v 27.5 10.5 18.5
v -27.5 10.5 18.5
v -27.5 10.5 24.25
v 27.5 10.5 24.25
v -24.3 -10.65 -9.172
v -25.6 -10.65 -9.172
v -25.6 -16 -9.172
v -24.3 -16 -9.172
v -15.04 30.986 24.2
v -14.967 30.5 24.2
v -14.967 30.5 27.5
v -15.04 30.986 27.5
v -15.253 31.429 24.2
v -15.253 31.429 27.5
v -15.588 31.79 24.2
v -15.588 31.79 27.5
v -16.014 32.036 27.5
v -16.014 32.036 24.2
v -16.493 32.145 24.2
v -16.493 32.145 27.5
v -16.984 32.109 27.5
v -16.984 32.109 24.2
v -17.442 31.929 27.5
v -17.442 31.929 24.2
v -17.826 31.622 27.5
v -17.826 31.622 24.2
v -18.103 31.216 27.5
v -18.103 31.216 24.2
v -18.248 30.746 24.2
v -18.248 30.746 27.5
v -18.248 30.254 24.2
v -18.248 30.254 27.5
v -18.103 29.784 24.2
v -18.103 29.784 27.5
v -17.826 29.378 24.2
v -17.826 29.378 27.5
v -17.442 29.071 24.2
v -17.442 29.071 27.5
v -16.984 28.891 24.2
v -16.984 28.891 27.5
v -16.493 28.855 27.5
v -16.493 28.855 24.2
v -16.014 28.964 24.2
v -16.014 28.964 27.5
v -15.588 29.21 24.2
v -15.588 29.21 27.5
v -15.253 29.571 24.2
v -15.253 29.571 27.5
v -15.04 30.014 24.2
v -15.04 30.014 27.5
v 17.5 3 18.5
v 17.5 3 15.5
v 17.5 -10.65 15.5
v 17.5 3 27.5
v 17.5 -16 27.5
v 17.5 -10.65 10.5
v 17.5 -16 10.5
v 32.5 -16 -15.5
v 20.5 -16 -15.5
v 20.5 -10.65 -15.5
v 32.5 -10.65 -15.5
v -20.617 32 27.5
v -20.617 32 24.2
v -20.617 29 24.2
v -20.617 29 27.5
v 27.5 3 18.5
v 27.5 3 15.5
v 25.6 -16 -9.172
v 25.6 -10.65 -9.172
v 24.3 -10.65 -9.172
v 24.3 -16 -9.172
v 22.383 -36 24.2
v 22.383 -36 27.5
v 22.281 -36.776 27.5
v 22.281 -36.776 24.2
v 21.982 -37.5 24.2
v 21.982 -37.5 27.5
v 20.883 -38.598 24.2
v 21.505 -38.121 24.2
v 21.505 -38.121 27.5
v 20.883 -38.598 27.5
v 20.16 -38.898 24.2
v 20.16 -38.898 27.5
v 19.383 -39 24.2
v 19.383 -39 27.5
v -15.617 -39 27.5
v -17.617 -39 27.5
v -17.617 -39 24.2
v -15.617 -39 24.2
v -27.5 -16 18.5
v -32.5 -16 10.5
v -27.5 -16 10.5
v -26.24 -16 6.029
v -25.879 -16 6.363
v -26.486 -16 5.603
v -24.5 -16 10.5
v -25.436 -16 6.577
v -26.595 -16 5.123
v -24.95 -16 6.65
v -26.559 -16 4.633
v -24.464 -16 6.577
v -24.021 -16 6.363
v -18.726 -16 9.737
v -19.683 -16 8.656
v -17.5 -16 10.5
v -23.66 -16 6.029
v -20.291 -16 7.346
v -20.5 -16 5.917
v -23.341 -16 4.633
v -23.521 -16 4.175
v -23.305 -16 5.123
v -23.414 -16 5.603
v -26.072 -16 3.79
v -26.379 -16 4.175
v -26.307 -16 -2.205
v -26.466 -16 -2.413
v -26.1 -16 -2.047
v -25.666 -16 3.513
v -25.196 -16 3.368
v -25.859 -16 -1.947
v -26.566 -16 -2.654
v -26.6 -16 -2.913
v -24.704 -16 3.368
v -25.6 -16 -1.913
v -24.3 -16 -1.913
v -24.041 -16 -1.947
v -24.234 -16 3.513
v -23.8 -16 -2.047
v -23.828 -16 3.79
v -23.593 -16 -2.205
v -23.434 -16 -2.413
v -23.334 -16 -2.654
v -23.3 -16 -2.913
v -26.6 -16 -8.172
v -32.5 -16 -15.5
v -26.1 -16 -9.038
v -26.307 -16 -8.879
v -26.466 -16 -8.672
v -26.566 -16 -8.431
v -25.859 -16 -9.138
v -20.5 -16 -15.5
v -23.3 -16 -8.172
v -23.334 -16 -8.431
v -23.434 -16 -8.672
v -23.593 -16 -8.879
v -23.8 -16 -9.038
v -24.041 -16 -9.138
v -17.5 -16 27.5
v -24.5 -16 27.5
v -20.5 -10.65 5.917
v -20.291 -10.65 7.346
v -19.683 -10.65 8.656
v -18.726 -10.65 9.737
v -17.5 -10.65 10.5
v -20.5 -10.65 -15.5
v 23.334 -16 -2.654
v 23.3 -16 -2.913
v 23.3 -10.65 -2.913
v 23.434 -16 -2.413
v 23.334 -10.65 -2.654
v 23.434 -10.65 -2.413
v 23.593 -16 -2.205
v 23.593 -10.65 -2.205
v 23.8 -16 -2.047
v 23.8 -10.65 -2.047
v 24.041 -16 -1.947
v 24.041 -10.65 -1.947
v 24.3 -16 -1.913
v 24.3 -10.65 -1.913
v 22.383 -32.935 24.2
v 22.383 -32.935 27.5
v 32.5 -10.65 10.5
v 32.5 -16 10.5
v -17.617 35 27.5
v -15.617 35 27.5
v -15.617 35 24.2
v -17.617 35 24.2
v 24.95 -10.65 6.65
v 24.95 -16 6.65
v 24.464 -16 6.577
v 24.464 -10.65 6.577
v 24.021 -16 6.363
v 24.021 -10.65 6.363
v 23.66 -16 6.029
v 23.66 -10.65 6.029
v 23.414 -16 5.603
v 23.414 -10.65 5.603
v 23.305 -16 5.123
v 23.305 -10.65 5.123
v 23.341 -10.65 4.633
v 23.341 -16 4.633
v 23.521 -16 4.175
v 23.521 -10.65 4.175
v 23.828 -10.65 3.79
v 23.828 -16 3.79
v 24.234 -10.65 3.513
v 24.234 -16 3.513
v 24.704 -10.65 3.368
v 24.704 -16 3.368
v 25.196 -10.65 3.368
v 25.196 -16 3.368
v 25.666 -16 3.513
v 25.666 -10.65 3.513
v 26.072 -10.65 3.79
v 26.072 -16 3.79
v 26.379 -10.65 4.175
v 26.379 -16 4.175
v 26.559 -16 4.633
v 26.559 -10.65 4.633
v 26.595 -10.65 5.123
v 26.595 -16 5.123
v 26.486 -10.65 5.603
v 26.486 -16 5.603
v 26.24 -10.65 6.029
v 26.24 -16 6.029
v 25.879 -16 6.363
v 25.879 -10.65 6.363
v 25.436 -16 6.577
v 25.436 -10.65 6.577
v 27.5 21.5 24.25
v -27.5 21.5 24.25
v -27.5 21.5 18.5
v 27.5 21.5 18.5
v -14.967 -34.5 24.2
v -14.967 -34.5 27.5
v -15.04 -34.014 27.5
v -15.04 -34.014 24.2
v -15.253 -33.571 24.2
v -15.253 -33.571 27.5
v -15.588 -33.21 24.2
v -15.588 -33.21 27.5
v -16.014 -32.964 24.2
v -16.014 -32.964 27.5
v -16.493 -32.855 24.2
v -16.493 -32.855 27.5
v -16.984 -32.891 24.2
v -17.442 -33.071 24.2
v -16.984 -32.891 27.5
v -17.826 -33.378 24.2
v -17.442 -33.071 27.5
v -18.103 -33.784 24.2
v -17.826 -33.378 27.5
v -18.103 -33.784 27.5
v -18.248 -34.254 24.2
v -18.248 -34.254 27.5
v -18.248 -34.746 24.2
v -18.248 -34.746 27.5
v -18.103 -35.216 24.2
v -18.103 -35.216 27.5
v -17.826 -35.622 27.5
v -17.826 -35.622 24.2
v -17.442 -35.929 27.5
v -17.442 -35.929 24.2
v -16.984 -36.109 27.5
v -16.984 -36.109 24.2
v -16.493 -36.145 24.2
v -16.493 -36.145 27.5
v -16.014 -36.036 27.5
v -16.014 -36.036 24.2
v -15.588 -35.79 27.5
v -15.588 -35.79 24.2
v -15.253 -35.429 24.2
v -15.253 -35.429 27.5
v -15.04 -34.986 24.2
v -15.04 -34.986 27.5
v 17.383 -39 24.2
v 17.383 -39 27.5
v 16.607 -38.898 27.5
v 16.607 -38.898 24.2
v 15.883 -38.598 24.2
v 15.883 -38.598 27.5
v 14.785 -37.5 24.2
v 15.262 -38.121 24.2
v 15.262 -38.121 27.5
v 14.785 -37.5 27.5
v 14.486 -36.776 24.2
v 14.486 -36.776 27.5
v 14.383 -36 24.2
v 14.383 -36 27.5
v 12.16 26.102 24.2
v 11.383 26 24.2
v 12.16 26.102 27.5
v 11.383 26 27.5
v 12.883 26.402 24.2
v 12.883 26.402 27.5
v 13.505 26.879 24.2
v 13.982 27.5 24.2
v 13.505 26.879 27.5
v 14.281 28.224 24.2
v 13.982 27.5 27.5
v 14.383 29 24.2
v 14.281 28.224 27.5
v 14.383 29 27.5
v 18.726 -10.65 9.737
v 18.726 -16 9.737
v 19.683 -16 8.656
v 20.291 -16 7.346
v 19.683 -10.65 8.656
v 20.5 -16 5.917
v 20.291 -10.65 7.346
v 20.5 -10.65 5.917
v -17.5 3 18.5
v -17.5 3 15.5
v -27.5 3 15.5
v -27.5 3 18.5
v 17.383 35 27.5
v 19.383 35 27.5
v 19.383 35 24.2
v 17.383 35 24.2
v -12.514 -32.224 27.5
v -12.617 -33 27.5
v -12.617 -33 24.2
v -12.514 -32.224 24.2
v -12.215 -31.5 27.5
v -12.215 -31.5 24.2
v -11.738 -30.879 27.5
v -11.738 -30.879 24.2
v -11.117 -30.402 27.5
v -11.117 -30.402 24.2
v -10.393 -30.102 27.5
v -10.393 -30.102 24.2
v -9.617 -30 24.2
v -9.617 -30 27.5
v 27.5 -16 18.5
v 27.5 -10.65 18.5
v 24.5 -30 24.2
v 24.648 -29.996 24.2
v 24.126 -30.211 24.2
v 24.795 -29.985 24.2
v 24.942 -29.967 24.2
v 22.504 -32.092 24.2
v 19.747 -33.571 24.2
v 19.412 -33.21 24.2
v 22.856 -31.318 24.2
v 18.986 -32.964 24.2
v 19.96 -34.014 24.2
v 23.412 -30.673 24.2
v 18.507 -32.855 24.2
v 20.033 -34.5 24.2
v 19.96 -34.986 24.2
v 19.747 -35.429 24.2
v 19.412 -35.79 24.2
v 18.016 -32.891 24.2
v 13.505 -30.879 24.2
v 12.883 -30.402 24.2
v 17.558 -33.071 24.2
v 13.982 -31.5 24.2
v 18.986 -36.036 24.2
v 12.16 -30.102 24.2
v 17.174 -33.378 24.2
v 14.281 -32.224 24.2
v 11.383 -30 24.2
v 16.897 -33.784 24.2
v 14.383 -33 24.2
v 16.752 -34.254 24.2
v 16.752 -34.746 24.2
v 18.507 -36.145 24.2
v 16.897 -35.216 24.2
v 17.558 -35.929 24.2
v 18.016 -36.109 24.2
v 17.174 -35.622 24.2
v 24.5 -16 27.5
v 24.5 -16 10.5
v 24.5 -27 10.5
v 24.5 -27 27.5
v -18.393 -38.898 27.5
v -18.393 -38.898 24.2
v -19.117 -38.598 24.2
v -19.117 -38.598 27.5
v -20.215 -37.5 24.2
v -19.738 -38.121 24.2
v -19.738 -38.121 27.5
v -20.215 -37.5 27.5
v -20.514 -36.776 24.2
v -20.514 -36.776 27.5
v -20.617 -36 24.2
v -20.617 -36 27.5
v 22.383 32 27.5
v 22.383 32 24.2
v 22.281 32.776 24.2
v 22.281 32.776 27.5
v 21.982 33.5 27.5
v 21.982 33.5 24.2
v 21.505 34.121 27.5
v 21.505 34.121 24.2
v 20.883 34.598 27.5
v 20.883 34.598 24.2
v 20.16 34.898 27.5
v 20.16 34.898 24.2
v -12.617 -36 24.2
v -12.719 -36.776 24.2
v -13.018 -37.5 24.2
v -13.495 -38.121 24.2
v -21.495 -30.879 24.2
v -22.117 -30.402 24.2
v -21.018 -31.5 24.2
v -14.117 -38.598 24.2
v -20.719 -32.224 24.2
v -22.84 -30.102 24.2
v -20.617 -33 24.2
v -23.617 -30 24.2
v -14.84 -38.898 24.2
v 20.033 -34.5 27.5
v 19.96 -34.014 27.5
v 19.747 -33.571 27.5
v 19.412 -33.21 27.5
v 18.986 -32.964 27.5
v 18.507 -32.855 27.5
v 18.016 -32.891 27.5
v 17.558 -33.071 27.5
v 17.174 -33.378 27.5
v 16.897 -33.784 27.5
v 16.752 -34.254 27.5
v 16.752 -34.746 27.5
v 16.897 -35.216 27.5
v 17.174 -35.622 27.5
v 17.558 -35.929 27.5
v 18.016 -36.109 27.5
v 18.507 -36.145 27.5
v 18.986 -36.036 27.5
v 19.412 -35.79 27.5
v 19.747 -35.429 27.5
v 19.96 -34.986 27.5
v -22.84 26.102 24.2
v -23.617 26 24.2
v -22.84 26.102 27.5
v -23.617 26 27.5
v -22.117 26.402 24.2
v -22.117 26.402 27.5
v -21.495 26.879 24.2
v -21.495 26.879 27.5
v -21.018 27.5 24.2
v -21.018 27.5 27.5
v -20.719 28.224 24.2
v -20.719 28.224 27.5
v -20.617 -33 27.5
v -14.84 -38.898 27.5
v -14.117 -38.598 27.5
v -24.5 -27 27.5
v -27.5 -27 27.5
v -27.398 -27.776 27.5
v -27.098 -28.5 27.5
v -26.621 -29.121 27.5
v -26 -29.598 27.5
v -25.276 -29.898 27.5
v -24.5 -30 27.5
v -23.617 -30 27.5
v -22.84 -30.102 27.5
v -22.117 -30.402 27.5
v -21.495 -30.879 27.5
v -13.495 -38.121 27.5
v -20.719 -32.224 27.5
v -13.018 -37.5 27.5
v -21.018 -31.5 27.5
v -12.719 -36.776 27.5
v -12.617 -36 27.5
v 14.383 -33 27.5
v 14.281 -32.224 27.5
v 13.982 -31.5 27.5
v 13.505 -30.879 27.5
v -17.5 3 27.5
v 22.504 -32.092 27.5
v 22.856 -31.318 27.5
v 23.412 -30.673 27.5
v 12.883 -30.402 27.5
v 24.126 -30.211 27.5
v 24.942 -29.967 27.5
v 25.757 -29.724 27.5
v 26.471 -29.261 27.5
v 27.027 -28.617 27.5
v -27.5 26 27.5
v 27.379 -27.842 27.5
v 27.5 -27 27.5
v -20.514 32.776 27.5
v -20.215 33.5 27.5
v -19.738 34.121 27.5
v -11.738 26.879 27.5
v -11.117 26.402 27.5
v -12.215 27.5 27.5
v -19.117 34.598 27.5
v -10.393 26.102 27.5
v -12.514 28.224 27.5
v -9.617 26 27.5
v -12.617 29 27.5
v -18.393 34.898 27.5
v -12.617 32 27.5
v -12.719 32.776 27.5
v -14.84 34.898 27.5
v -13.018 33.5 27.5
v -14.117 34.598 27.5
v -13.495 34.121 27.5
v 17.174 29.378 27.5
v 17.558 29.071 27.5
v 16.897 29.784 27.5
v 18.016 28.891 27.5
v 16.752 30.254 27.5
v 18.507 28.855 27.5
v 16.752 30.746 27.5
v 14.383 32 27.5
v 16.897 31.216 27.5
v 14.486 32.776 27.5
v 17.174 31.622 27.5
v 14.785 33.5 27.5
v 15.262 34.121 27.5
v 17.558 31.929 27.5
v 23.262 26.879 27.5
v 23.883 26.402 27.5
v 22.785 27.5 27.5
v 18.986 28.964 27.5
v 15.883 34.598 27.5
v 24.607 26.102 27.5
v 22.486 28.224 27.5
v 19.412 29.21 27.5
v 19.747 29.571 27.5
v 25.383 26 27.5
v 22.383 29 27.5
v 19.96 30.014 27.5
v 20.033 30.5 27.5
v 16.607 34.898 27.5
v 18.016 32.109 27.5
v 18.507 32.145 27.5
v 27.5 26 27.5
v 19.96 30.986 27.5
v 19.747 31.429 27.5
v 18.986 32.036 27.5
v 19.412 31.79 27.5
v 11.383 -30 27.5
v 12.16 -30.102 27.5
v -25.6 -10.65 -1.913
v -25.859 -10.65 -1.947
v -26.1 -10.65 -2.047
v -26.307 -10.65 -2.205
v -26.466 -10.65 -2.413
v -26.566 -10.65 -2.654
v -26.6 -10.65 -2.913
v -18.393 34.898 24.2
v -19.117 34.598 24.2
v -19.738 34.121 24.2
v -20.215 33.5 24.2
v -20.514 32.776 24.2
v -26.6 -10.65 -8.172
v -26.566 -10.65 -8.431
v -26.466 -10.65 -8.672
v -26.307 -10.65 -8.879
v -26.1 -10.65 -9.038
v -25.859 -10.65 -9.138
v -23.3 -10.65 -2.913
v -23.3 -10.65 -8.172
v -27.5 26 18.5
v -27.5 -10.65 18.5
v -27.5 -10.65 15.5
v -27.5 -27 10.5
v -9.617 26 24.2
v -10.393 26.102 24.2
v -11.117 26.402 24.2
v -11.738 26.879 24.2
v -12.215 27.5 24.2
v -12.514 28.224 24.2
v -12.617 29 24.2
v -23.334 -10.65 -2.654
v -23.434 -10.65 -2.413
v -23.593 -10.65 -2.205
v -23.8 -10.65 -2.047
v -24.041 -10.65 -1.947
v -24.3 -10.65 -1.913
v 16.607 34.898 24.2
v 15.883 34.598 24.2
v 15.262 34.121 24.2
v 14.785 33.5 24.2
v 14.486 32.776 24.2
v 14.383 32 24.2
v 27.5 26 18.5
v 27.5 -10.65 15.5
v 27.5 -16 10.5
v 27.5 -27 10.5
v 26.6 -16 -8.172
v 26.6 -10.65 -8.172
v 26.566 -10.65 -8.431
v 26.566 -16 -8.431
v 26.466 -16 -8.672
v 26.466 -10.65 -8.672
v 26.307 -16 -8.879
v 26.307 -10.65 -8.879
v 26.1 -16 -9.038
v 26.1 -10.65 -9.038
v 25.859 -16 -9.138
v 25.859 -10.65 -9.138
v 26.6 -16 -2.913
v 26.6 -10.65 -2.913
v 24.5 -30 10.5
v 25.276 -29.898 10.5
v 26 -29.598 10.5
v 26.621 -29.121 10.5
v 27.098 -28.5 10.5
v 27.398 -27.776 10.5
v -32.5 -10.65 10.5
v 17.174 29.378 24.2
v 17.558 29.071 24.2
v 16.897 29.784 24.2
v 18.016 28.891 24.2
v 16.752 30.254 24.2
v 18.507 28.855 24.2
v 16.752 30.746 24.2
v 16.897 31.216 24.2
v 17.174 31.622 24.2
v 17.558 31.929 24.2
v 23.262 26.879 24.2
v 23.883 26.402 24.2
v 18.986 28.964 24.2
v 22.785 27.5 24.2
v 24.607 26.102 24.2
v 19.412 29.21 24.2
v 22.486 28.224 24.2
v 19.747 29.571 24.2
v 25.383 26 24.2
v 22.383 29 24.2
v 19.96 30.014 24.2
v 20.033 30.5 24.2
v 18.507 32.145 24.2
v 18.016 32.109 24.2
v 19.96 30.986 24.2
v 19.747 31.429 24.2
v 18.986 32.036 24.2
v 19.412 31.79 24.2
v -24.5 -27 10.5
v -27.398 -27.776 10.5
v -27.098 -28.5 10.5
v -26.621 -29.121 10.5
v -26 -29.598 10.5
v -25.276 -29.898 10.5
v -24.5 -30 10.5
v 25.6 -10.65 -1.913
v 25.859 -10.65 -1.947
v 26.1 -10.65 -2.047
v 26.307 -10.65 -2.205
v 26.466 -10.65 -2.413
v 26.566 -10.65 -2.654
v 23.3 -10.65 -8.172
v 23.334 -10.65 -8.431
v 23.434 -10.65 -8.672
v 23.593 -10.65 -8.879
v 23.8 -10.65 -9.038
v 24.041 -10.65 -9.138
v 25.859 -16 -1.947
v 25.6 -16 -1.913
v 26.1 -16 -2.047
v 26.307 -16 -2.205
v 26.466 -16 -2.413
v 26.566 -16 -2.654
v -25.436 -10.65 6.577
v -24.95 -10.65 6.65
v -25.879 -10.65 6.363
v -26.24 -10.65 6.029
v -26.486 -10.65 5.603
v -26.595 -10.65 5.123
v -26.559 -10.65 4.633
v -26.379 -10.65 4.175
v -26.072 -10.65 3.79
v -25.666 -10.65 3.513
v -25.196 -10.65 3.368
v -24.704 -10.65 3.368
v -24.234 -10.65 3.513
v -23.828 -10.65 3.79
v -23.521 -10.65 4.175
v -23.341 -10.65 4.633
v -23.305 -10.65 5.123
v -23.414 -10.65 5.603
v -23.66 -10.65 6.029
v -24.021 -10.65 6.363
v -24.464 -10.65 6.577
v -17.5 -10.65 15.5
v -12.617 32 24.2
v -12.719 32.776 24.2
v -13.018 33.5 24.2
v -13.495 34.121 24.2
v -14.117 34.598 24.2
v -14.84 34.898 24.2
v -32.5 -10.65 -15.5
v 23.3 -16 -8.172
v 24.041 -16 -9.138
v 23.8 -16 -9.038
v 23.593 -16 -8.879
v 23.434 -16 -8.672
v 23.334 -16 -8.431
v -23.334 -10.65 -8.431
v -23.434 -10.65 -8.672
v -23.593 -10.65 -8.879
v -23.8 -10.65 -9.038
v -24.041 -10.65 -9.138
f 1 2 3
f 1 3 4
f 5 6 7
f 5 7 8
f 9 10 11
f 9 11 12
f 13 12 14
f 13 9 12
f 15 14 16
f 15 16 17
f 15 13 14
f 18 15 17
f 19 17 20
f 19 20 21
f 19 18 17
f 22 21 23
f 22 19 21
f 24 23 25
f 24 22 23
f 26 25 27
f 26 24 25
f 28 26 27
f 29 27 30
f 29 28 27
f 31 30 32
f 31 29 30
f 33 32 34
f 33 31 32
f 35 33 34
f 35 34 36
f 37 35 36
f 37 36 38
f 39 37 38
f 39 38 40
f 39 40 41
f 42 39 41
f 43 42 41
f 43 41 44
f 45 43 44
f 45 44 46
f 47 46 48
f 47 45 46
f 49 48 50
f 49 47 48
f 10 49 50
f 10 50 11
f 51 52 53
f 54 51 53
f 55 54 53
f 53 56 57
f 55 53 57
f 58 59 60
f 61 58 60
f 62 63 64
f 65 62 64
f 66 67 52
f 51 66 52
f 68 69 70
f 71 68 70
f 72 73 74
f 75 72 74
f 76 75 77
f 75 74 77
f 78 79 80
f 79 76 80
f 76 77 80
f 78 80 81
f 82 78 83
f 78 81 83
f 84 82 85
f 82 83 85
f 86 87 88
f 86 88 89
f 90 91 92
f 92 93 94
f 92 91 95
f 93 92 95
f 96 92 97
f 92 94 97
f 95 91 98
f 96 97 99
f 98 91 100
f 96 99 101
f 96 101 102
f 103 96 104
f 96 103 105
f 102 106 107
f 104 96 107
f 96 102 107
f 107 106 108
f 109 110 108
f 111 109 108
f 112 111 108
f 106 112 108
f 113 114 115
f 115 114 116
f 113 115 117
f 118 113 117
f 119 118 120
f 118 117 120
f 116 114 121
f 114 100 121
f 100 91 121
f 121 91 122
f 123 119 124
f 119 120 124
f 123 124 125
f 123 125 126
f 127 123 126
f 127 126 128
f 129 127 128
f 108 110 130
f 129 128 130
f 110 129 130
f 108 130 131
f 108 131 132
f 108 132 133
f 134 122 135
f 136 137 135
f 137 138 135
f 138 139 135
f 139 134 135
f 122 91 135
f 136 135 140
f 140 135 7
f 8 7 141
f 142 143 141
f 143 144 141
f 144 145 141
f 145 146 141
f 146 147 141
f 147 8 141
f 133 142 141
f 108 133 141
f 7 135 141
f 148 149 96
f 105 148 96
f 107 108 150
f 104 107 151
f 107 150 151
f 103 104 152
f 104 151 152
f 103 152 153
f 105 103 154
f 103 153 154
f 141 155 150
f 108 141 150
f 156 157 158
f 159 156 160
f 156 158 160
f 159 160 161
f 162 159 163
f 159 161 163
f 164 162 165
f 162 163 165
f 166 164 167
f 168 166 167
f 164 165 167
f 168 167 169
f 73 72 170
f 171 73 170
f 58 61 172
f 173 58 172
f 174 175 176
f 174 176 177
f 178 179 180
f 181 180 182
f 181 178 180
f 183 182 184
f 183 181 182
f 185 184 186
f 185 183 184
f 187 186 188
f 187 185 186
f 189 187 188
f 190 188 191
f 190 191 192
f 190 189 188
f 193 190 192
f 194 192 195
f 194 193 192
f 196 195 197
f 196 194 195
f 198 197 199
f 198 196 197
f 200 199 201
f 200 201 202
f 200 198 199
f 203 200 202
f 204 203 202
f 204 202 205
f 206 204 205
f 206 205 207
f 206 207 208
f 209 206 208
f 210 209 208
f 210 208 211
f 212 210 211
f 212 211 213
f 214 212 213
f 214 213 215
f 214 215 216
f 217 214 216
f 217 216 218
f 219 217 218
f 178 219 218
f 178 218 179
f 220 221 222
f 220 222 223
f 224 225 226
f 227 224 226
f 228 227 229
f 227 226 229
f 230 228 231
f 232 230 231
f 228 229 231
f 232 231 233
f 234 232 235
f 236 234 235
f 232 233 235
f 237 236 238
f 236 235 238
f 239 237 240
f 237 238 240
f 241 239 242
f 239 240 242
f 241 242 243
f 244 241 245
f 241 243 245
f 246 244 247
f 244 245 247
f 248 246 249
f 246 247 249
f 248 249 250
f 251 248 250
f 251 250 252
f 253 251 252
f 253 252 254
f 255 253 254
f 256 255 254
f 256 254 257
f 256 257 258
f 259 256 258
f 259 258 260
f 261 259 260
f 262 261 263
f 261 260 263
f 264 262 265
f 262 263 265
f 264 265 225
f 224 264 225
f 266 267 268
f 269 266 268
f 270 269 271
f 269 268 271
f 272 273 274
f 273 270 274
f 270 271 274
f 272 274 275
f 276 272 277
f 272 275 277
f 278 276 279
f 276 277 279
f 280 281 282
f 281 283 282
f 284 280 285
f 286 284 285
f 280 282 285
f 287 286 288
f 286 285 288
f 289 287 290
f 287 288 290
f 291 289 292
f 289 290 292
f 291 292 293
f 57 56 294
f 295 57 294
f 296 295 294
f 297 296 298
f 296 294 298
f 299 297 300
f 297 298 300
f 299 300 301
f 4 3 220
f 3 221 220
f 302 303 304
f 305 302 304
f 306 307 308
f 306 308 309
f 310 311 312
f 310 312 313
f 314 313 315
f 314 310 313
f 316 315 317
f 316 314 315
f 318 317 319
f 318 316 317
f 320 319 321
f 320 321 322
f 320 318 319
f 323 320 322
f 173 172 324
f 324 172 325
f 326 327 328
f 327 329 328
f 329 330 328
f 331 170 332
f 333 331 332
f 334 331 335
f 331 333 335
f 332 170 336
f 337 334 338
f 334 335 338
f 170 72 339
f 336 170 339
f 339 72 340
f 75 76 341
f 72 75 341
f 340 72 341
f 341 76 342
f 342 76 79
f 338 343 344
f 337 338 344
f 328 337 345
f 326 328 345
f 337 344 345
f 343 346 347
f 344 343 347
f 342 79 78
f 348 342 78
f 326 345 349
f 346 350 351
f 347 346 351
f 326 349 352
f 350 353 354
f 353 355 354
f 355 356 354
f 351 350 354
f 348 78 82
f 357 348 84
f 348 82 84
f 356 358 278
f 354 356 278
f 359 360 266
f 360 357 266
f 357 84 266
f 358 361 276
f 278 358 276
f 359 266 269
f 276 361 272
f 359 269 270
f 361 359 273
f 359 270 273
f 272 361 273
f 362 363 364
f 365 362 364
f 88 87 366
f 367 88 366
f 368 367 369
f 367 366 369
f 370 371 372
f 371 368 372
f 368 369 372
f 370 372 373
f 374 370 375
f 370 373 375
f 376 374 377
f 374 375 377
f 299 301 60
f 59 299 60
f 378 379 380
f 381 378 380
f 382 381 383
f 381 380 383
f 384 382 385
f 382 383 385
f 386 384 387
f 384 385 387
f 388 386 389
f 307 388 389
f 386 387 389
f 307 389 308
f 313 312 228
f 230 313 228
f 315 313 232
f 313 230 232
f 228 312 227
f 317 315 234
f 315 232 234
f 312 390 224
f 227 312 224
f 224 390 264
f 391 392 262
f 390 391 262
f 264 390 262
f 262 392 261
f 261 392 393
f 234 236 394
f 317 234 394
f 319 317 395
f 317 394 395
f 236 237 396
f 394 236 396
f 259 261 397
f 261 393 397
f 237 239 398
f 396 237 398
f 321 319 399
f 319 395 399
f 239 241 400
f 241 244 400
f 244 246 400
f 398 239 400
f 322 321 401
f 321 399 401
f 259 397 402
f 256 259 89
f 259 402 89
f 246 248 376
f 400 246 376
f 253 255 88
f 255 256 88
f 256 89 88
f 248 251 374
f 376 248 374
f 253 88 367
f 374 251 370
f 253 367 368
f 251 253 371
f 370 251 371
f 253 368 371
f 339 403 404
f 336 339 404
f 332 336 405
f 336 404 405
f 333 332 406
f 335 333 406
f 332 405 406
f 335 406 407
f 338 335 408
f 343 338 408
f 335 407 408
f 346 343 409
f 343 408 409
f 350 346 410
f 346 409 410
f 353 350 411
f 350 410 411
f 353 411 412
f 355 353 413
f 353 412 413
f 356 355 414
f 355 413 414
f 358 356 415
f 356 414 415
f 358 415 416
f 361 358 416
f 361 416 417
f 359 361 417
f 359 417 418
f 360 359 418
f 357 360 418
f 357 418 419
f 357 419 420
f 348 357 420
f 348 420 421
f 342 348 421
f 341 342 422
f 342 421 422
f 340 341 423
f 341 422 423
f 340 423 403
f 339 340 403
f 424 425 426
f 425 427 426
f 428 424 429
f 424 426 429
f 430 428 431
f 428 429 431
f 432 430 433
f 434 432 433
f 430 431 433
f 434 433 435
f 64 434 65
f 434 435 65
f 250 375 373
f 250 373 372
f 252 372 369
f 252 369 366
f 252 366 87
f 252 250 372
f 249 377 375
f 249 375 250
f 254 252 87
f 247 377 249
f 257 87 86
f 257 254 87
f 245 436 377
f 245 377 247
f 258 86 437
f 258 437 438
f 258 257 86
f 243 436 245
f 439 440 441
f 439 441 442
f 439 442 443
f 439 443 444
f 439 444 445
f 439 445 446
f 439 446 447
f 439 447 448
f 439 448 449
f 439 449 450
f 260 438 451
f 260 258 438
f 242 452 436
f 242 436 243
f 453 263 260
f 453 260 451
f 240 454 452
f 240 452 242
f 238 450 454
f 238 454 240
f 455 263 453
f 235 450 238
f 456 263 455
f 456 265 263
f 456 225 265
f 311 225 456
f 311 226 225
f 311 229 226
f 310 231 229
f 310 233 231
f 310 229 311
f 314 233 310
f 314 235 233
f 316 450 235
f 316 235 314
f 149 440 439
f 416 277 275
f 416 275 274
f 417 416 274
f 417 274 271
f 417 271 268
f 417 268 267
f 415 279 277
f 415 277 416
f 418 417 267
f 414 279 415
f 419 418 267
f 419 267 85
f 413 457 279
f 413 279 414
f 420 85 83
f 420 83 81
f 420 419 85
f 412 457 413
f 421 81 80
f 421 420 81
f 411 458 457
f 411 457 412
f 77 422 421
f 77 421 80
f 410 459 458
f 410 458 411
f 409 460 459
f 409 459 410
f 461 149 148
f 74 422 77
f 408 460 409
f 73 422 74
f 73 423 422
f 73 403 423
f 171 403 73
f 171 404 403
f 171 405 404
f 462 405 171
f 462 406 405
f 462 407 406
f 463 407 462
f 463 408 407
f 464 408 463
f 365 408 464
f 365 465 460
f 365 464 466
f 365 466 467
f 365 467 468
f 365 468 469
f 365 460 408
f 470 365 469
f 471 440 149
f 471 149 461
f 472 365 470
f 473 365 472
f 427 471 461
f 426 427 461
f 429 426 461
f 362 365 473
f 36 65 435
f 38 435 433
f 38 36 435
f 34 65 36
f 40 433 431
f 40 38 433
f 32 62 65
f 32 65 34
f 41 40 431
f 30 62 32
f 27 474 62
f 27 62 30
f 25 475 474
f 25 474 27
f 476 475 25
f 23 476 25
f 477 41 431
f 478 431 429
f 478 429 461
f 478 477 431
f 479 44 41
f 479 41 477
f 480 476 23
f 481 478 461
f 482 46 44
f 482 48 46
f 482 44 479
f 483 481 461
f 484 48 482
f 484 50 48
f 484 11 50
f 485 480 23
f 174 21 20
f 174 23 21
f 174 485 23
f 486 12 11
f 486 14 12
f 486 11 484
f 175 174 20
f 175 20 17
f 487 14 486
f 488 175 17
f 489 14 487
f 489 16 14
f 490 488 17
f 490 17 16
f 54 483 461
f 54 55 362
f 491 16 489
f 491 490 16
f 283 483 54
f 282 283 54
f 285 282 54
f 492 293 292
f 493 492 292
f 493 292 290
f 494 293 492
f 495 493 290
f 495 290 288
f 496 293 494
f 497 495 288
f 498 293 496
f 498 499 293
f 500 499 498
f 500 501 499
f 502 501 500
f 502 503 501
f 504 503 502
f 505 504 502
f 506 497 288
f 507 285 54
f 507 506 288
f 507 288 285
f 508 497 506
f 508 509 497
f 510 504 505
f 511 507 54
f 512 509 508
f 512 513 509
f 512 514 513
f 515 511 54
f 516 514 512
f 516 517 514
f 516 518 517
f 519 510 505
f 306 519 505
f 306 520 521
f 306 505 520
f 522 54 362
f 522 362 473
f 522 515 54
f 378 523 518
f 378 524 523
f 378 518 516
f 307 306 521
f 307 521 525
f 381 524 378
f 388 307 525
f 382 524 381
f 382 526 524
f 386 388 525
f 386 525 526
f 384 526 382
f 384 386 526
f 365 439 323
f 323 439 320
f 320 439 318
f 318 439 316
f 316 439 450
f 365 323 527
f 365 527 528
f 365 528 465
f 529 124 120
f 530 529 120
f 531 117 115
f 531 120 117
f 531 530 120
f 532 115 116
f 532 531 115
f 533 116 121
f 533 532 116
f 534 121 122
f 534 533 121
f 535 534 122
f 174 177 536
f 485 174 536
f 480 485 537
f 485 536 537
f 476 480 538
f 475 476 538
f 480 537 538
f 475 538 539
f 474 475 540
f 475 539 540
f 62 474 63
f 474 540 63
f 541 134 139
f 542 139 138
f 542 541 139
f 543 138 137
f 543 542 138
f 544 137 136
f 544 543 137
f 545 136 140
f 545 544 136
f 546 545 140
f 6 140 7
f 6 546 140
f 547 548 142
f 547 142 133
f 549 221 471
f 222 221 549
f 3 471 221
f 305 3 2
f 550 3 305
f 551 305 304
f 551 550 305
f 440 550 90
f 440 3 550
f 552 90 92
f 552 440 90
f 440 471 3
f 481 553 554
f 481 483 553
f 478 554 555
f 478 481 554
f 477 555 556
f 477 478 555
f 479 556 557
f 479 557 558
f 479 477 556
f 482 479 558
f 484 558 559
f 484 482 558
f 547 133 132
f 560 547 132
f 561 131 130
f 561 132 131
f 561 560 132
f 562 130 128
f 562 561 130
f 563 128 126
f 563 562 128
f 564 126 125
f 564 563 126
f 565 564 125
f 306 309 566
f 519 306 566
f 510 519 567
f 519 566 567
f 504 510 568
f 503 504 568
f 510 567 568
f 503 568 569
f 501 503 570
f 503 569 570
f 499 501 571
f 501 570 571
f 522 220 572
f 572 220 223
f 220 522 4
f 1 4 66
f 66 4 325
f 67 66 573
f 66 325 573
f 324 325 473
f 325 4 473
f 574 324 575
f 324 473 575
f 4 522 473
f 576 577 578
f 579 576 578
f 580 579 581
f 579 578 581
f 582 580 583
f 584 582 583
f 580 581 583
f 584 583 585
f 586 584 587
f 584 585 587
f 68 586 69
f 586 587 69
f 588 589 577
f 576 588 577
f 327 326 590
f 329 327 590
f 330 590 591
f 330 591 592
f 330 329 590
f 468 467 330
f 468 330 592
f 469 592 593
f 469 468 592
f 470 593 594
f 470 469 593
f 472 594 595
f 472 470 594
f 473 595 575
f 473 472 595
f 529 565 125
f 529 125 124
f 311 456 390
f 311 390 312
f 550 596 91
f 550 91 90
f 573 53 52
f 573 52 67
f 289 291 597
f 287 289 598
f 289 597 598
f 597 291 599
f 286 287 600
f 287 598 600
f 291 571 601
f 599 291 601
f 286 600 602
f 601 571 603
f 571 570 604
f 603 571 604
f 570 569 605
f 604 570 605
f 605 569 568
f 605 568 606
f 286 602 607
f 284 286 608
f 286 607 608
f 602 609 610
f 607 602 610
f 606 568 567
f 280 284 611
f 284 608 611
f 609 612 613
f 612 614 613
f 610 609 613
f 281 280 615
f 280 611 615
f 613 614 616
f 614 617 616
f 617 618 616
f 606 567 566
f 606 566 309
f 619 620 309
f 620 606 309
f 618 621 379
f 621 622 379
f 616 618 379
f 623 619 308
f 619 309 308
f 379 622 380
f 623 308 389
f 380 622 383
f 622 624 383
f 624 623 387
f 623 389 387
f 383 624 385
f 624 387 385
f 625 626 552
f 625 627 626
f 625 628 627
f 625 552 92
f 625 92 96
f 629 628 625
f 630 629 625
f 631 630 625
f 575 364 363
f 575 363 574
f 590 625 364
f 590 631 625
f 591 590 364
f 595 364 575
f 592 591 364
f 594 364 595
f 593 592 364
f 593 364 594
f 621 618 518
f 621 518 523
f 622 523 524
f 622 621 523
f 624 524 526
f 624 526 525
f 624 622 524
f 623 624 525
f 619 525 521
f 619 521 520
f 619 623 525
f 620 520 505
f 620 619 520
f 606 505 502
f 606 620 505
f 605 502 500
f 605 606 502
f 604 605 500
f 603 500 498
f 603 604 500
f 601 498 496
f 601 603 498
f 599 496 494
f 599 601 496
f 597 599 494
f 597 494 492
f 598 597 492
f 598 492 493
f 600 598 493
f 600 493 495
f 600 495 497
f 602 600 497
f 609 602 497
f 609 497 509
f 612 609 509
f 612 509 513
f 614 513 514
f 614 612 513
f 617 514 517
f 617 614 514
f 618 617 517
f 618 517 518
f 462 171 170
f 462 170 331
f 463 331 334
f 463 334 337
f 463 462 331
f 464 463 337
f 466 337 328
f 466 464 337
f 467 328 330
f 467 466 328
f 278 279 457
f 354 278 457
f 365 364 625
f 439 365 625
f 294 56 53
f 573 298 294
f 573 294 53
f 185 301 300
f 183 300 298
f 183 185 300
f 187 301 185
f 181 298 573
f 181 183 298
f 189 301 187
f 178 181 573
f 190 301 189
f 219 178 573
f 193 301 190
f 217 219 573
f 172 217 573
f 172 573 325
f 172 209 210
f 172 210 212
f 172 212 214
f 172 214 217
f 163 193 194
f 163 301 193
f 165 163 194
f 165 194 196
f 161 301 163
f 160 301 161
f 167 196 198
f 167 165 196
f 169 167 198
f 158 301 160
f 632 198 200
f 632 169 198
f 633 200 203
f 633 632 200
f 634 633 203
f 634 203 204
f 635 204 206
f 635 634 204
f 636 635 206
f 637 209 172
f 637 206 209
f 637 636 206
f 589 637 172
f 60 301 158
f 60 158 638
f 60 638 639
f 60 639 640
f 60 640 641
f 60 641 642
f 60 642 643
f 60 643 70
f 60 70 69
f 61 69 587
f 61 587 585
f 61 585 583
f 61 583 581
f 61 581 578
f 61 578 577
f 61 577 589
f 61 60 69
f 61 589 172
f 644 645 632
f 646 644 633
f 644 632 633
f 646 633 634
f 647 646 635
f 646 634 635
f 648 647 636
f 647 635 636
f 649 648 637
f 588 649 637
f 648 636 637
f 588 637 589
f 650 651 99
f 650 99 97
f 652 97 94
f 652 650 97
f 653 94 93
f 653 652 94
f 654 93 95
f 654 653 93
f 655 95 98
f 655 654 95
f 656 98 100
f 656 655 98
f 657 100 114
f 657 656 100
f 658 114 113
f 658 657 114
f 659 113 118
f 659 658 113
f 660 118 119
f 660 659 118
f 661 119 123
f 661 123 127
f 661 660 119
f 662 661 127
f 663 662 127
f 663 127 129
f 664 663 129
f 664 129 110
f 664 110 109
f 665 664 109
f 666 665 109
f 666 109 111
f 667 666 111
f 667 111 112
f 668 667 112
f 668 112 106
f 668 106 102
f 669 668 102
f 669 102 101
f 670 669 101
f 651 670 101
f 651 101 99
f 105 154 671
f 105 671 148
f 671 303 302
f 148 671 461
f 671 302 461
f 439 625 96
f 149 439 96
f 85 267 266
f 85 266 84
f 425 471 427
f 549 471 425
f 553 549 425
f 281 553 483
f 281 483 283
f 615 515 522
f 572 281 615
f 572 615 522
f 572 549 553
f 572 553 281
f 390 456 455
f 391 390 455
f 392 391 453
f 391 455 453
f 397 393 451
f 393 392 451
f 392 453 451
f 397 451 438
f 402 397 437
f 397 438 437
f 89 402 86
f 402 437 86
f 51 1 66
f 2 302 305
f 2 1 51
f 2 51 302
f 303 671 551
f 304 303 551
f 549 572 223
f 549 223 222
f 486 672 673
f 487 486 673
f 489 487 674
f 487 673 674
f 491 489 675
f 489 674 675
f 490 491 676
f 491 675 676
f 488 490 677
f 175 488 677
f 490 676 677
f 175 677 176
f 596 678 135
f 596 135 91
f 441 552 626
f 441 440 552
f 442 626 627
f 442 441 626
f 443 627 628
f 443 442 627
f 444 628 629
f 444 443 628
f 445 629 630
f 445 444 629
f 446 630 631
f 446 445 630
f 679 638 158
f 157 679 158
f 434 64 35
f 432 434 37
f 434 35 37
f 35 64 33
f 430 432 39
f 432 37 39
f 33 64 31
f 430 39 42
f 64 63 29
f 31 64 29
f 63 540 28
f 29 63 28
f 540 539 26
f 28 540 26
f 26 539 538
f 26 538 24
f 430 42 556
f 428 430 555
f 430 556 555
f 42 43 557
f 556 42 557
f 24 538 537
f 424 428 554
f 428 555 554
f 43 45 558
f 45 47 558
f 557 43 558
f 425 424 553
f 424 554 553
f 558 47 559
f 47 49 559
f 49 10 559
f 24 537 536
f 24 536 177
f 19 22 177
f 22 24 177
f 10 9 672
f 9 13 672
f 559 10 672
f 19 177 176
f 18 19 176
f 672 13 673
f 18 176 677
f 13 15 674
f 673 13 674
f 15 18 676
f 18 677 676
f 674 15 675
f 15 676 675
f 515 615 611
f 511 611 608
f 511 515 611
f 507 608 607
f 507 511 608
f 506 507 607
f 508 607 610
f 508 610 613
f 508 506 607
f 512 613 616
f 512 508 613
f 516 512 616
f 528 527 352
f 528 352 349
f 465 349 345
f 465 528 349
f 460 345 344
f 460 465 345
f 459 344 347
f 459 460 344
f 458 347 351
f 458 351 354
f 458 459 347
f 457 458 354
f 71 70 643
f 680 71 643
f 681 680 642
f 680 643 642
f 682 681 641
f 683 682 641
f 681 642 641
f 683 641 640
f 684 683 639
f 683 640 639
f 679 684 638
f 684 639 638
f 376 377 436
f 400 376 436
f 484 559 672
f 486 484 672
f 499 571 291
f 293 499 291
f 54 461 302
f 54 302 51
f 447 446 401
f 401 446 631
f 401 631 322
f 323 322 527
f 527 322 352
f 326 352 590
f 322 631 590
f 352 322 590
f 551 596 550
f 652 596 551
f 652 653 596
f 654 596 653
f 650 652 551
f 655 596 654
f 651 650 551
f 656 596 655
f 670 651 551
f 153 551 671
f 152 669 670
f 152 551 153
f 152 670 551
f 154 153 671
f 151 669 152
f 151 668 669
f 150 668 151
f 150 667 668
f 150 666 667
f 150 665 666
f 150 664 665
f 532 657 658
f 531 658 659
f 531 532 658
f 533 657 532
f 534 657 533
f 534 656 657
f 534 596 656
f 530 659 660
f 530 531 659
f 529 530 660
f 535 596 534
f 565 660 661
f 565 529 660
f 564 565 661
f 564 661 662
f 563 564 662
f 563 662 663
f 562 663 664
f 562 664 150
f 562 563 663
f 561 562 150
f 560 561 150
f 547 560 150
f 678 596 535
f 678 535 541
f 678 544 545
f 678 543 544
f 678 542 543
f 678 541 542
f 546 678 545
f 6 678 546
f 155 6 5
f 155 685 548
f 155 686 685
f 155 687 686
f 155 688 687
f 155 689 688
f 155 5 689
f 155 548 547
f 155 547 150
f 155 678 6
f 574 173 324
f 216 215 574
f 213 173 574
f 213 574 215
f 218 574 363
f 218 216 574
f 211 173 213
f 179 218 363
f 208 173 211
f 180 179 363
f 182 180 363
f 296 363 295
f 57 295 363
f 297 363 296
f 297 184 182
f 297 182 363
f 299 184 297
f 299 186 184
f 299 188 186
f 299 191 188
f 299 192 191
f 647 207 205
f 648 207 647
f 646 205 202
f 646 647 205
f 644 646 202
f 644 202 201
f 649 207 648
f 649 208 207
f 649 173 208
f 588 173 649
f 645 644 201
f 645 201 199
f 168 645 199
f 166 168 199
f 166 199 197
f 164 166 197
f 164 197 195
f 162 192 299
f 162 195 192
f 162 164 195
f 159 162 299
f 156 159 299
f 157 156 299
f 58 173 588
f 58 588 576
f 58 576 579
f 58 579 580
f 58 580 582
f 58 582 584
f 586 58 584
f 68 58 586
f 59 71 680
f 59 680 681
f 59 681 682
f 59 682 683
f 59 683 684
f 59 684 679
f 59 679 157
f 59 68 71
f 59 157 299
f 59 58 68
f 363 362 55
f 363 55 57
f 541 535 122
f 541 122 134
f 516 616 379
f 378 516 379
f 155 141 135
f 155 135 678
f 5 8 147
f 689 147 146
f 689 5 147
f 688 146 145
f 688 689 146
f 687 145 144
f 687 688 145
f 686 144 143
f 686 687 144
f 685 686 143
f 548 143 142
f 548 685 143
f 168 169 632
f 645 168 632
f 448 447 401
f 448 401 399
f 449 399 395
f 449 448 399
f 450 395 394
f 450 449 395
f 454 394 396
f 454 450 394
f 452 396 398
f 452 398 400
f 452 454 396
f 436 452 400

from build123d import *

# Parameters (mm, degrees)
SKETCH_1_W           = 7
SKETCH_1_H           = 21
SKETCH_1_R           = 1.65
EXTRUDE_1_DEPTH      = 3
EXTRUDE_1_2_DEPTH    = 3
SKETCH_2_W           = 55
SKETCH_2_H           = 30
EXTRUDE_2_DEPTH      = 3
SKETCH_3_W           = 55
SKETCH_3_H           = 30
EXTRUDE_3_DEPTH      = 14
SKETCH_4_W           = 55
SKETCH_4_H           = 17
EXTRUDE_4_DEPTH      = 22
SKETCH_5_W           = 66.735039671
SKETCH_5_H           = 6
CUT_EXTRUDE_1_DEPTH  = 13.75
CUT_EXTRUDE_2_DEPTH  = 20
SKETCH2_W            = 7
SKETCH2_H            = 21
SKETCH2_R            = 1.65
BOSS_EXTRUDE1_DEPTH  = 3
SKETCH3_W            = 7
SKETCH3_H            = 6
BOSS_EXTRUDE2_DEPTH  = 5
SKETCH4_W            = 3
SKETCH4_H            = 6
BOSS_EXTRUDE3_DEPTH  = 41
SKETCH5_W            = 8
SKETCH5_H            = 9
SKETCH5_R            = 1.65
BOSS_EXTRUDE4_DEPTH  = 3.3
FILLET1_R            = 5
FILLET2_R            = 3
FILLET3_R            = 3
SKETCH6_W            = 55
SKETCH6_H            = 17
BOSS_EXTRUDE5_DEPTH  = 4
MIRROR2_START        = 24.2
MIRROR2_OUTLINE_R    = 1.65
MIRROR2_DEPTH        = 3.3
FILLET4_R            = 3
SKETCH8_W            = 55
SKETCH8_H            = 7
CUT_EXTRUDE1_DEPTH   = 8
SKETCH10_R           = 1.65
BOSS_EXTRUDE6_DEPTH  = 10
CUT_EXTRUDE2_DEPTH   = 10
SKETCH12_W           = 55
SKETCH12_H           = 13.75
CUT_EXTRUDE3_DEPTH   = 2.5
CUT_EXTRUDE4_DEPTH   = 10
SKETCH15_W           = 41
SKETCH15_H           = 3
CUT_EXTRUDE5_DEPTH   = 60.476886267
SKETCH17_W           = 55
SKETCH17_H           = 5.75
CUT_EXTRUDE6_DEPTH   = 2.5
BOSS_EXTRUDE8_DEPTH  = 17
SKETCH19_W           = 55
SKETCH19_H           = 7.5
CUT_EXTRUDE8_DEPTH   = 8
SKETCH20_W           = 10
SKETCH20_H           = 13
CUT_EXTRUDE9_DEPTH   = 5
SKETCH16_W           = 26
SKETCH16_H           = 6
BOSS_EXTRUDE9_DEPTH  = 5
BOSS_EXTRUDE10_DEPTH = 6
SKETCH23_R           = 1.65
CUT_EXTRUDE10_DEPTH  = 0.65


# Read off the part's stored shape, not the designer's step: Mirror2
with BuildPart() as part:
    # 草图1 → 凸台-拉伸1 (new body)
    with BuildSketch(Plane(origin=(0, 0, 0), x_dir=(1, 0, 0), z_dir=(0, 1, 0))):
        with Locations((-24, 0)):
            Rectangle(SKETCH_1_W, SKETCH_1_H)
        with Locations(Location((-24.95, -5, 0), (0, 0, 270))):
            Circle(SKETCH_1_R, mode=Mode.SUBTRACT)
        with Locations(Location((-24.95, 5, 0), (0, 0, 270))):
            Circle(SKETCH_1_R, mode=Mode.SUBTRACT)
    extrude(amount=-EXTRUDE_1_DEPTH)



with BuildPart() as body_2:
    # 草图1 → Extrude 1 2 (new body)
    with BuildSketch(Plane(origin=(0, 0, 0), x_dir=(1, 0, 0), z_dir=(0, 1, 0))):
        with Locations((24, 0)):
            Rectangle(SKETCH_1_W, SKETCH_1_H)
        with Locations(Location((24.95, -5, 0), (0, 0, 270))):
            Circle(SKETCH_1_R, mode=Mode.SUBTRACT)
        with Locations(Location((24.95, 5, 0), (0, 0, 270))):
            Circle(SKETCH_1_R, mode=Mode.SUBTRACT)
    extrude(amount=-EXTRUDE_1_2_DEPTH)


with BuildPart() as part_1:
    add(part.part)

    add(body_2.part)  # 凸台-拉伸2 merges body 2
    # 草图2 → 凸台-拉伸2 (add)
    with BuildSketch(Plane.XY.offset(10.5)):
        with Locations((0, -15)):
            Rectangle(SKETCH_2_W, SKETCH_2_H)
    extrude(amount=EXTRUDE_2_DEPTH)

    # 草图3 → 凸台-拉伸3 (add)
    with BuildSketch(Plane.XY.offset(13.5)):
        with Locations((0, -15)):
            Rectangle(SKETCH_3_W, SKETCH_3_H)
    extrude(amount=EXTRUDE_3_DEPTH)

    # 草图4 → 凸台-拉伸4 (add)
    with BuildSketch(Plane(origin=(0, 0, 0), x_dir=(1, 0, 0), z_dir=(0, 1, 0))):
        with Locations((0, -19)):
            Rectangle(SKETCH_4_W, SKETCH_4_H)
    extrude(amount=EXTRUDE_4_DEPTH)

    # 草图5 → 切除-拉伸1 (cut)
    with BuildSketch(Plane(origin=(0, 0, 10.5), x_dir=(-1, 0, 0), z_dir=(0, 0, -1))):
        with Locations((1.017100612, 16)):
            Rectangle(SKETCH_5_W, SKETCH_5_H)
    extrude(amount=-CUT_EXTRUDE_1_DEPTH, mode=Mode.SUBTRACT)

    # 草图6 → 切除-拉伸2 (cut)
    with BuildSketch(Plane(origin=(0, 0, 10.5), x_dir=(-1, 0, 0), z_dir=(0, 0, -1))):
        Polygon((-24.5, 3), (-17.5, 3), (-17.5, -6), (-24.5, -6), (-24.5, -27), (24.5, -27), (24.5, -6), (17.5, -6), (17.5, 3), (24.5, 3), (24.5, 10), (-24.5, 10), align=None)
    extrude(amount=-CUT_EXTRUDE_2_DEPTH, mode=Mode.SUBTRACT)

    # Sketch2 → Boss-Extrude1 (add)
    # profile 1 of 2: a face of its own
    with BuildSketch(Plane.XZ.offset(3)):
        with Locations((24, 0)):
            Rectangle(SKETCH2_W, SKETCH2_H)
        with Locations(Location((24.95, -5, 0), (0, 0, 90))):
            Circle(SKETCH2_R, mode=Mode.SUBTRACT)
        with Locations(Location((24.95, 5, 0), (0, 0, 90))):
            Circle(SKETCH2_R, mode=Mode.SUBTRACT)
    # profile 2 of 2: a face of its own
    with BuildSketch(Plane.XZ.offset(3)):
        with Locations((-24, 0)):
            Rectangle(SKETCH2_W, SKETCH2_H)
        with Locations(Location((-24.95, -5, 0), (0, 0, 90))):
            Circle(SKETCH2_R, mode=Mode.SUBTRACT)
        with Locations(Location((-24.95, 5, 0), (0, 0, 90))):
            Circle(SKETCH2_R, mode=Mode.SUBTRACT)
    extrude(amount=BOSS_EXTRUDE1_DEPTH)

    # Sketch3 → Boss-Extrude2 (add)
    with BuildSketch(Plane(origin=(0, 0, -10.5), x_dir=(-1, 0, 0), z_dir=(0, 0, -1))):
        with Locations((-24, -3)):
            Rectangle(SKETCH3_W, SKETCH3_H)
        with Locations((24, -3)):
            Rectangle(SKETCH3_W, SKETCH3_H)
    extrude(amount=BOSS_EXTRUDE2_DEPTH)

    # Sketch4 → Boss-Extrude3 (add)
    with BuildSketch(Plane.ZY.offset(-20.5)):
        with Locations((-14, -3)):
            Rectangle(SKETCH4_W, SKETCH4_H)
    extrude(amount=BOSS_EXTRUDE3_DEPTH)

    # Sketch5 → Boss-Extrude4 (add)
    # profile 1 of 2: a face of its own
    with BuildSketch(Plane.XY.offset(27.5)):
        with Locations((18.383478606, -34.5)):
            Rectangle(SKETCH5_W, SKETCH5_H)
        with Locations((18.383478606, -34.5)):
            Circle(SKETCH5_R, mode=Mode.SUBTRACT)
    # profile 2 of 2: a face of its own
    with BuildSketch(Plane.XY.offset(27.5)):
        with Locations((-16.616521394, -34.5)):
            Rectangle(SKETCH5_W, SKETCH5_H)
        with Locations((-16.616521394, -34.5)):
            Circle(SKETCH5_R, mode=Mode.SUBTRACT)
    extrude(amount=-BOSS_EXTRUDE4_DEPTH)

    # Fillet1
    # the kernel refuses this fillet: 5 mm, written as the material it adds along each edge
    with BuildSketch(Plane(origin=(-20.5, 0, 10.5), x_dir=(1, 0, 0), z_dir=(0, -1, 0)), Plane(origin=(20.5, -6, 10.5), x_dir=(-1, 0, 0), z_dir=(0, 1, 0))) as fillet1_piece_1:
        with BuildLine():
            CenterArc((5, -4.582575695), FILLET1_R, 113.578178478, 66.421821522)
            Line((0, -4.582575695), (-0.1, -4.582575695))
            Line((-0.1, -4.582575695), (-0.1, 0))
            Line((-0.1, 0), (0, 0.1))
            ThreePointArc((0, 0.1), (1.5, 0.1), (2.96, 0.091651514))
            Line((2.96, 0.091651514), (3, 0))
        make_face()
    extrude(amount=6)

    # Fillet2
    fillet2_edges = [part_1.edges().sort_by_distance(p)[0] for p in [
        (24.5, 3, 19),
        (-24.5, 3, 19),
        (-27.5, -30, 19),
        (27.5, -30, 19),
    ]]
    fillet(fillet2_edges, radius=FILLET2_R)

    # Fillet3
    # the kernel refuses this fillet: 3 mm, written as the material it adds along each edge
    with BuildSketch(Plane(origin=(-20.616521394, -30, 27.5), x_dir=(-1, 0, 0), z_dir=(0, 0, -1)), Plane(origin=(14.383478606, -30, 27.5), x_dir=(-1, 0, 0), z_dir=(0, 0, -1))) as fillet3_piece_1:
        with BuildLine():
            CenterArc((FILLET3_R, -FILLET3_R), FILLET3_R, 90, 90)
            Line((0, -FILLET3_R), (0, 0))
            Line((0, 0), (FILLET3_R, 0))
        make_face()
    extrude(amount=3.3)
    with BuildSketch(Plane(origin=(-12.616521394, -30, 27.5), x_dir=(1, 0, 0), z_dir=(0, 0, -1))) as fillet3_piece_2:
        with BuildLine():
            CenterArc((FILLET3_R, FILLET3_R), FILLET3_R, 180, 90)
            Line((0, FILLET3_R), (0, 0))
            Line((0, 0), (FILLET3_R, 0))
        make_face()
    extrude(amount=3.3)
    with BuildSketch(Plane(origin=(22.383478606, -30, 27.5), x_dir=(0.9999183162467798, 0.012781268880858251, 0), z_dir=(0, 0, -1))) as fillet3_piece_3:
        with BuildLine():
            CenterArc((2.96224705, 2.97270312), FILLET3_R, 180.732332704, 81.532613054)
            Line((-0.037507899, 2.934359313), (-0.337483394, 2.930524932))
            Line((-0.337483394, 2.930524932), (-0.299975495, -0.003834381))
            Line((-0.299975495, -0.003834381), (0.003834381, -0.299975495))
            ThreePointArc((0.003834381, -0.299975495), (2.12018289, -0.272923666), (2.518091946, -0.297270312))
            Line((2.518091946, -0.297270312), (2.558469683, 0))
        make_face()
    extrude(amount=3.3)
    # the kernel refuses this fillet: 3 mm, written as the material it takes off along each edge
    with BuildSketch(Plane(origin=(-12.616521394, -39, 35), x_dir=(0, 1, 0), z_dir=(0, 0, -1)), Plane(origin=(-20.616521394, -39, 35), x_dir=(1, 0, 0), z_dir=(0, 0, -1)), Plane(origin=(22.383478606, -39, 35), x_dir=(0, 1, 0), z_dir=(0, 0, -1)), Plane(origin=(14.383478606, -39, 35), x_dir=(1, 0, 0), z_dir=(0, 0, -1))) as fillet3_2_piece_1:
        with BuildLine():
            CenterArc((FILLET3_R, -FILLET3_R), FILLET3_R, 90, 90)
            Line((0, -FILLET3_R), (0, 0))
            Line((0, 0), (FILLET3_R, 0))
        make_face()
    extrude(amount=18.3, mode=Mode.SUBTRACT)

    # Sketch6 → Boss-Extrude5 (add)
    with BuildSketch(Plane(origin=(0, 22, 0), x_dir=(1, 0, 0), z_dir=(0, 1, 0))):
        with Locations((0, -19)):
            Rectangle(SKETCH6_W, SKETCH6_H)
    extrude(amount=BOSS_EXTRUDE5_DEPTH)

    # Mirror2 outline → Mirror2 (add)
    # profile 1 of 2: a face of its own
    with BuildSketch(Plane.XY.offset(MIRROR2_START)):
        with BuildLine():
            Line((14.383478606, 32), (14.383478606, 26))
            Line((14.383478606, 26), (22.383478606, 26))
            Line((22.383478606, 26), (22.383478606, 32))
            ThreePointArc((22.383478606, 32), (21.504798949, 34.121320343), (19.383478606, 35))
            Line((19.383478606, 35), (17.383478606, 35))
            ThreePointArc((17.383478606, 35), (15.262158262, 34.121320344), (14.383478606, 32))
        make_face()
        with Locations((18.383478606, 30.5)):
            Circle(MIRROR2_OUTLINE_R, mode=Mode.SUBTRACT)
    # profile 2 of 2: a face of its own
    with BuildSketch(Plane.XY.offset(MIRROR2_START)):
        with BuildLine():
            Line((-20.616521394, 26), (-12.616521394, 26))
            Line((-12.616521394, 26), (-12.616521394, 32))
            ThreePointArc((-12.616521394, 32), (-13.495201051, 34.121320343), (-15.616521394, 35))
            Line((-15.616521394, 35), (-17.616521394, 35))
            ThreePointArc((-17.616521394, 35), (-19.737841738, 34.121320344), (-20.616521394, 32))
            Line((-20.616521394, 32), (-20.616521394, 26))
        make_face()
        with Locations((-16.616521394, 30.5)):
            Circle(MIRROR2_OUTLINE_R, mode=Mode.SUBTRACT)
    extrude(amount=MIRROR2_DEPTH)

    # Fillet4
    fillet4_edges = [part_1.edges().sort_by_distance(p)[0] for p in [
        (-12.616521394, 26, 25.85),
        (-20.616521394, 26, 25.85),
        (22.383478606, 26, 25.85),
        (14.383478606, 26, 25.85),
    ]]
    fillet(fillet4_edges, radius=FILLET4_R)

    # Sketch8 → Cut-Extrude1 (cut)
    with BuildSketch(Plane(origin=(0, 0, 10.5), x_dir=(-1, 0, 0), z_dir=(0, 0, -1))):
        with Locations((0, 22.5)):
            Rectangle(SKETCH8_W, SKETCH8_H)
    extrude(amount=-CUT_EXTRUDE1_DEPTH, mode=Mode.SUBTRACT)

    # Sketch10 → Boss-Extrude6 (add)
    with BuildSketch(Plane.XZ.offset(6)):
        with BuildLine():
            Line((-17.5, 27.5), (-24.5, 27.5))
            Line((-24.5, 27.5), (-24.5, 10.5))
            Line((-24.5, 10.5), (-27.5, 10.5))
            Line((-27.5, 10.5), (-27.5, -15.5))
            Line((-27.5, -15.5), (27.5, -15.5))
            Line((27.5, -15.5), (27.5, 10.5))
            Line((27.5, 10.5), (24.5, 10.5))
            Line((24.5, 10.5), (24.5, 27.5))
            Line((24.5, 27.5), (17.5, 27.5))
            Line((17.5, 27.5), (17.5, 10.5))
            ThreePointArc((17.5, 10.5), (19.683300133, 8.656037093), (20.5, 5.917424305))
            Line((20.5, 5.917424305), (20.5, -12.5))
            Line((20.5, -12.5), (-20.5, -12.5))
            Line((-20.5, -12.5), (-20.5, 5.917424305))
            ThreePointArc((-20.5, 5.917424305), (-19.683300133, 8.656037093), (-17.5, 10.5))
            Line((-17.5, 10.5), (-17.5, 27.5))
        make_face()
        with Locations(Location((24.95, -5, 0), (0, 0, 90))):
            Circle(SKETCH10_R, mode=Mode.SUBTRACT)
        with Locations(Location((24.95, 5, 0), (0, 0, 90))):
            Circle(SKETCH10_R, mode=Mode.SUBTRACT)
        with Locations(Location((-24.95, 5, 0), (0, 0, 90))):
            Circle(SKETCH10_R, mode=Mode.SUBTRACT)
        with Locations(Location((-24.95, -5, 0), (0, 0, 90))):
            Circle(SKETCH10_R, mode=Mode.SUBTRACT)
    extrude(amount=BOSS_EXTRUDE6_DEPTH)

    # Sketch11 → Cut-Extrude2 (cut)
    with BuildSketch(Plane(origin=(0, 0, 0), x_dir=(1, 0, 0), z_dir=(0, 1, 0))):
        with BuildLine():
            Line((-27.5, -10.5), (-17.5, -10.5))
            ThreePointArc((-17.5, -10.5), (-19.683300133, -8.656037093), (-20.5, -5.917424305))
            Line((-20.5, -5.917424305), (-20.5, 12.5))
            Line((-20.5, 12.5), (20.5, 12.5))
            Line((20.5, 12.5), (20.5, -5.917424305))
            ThreePointArc((20.5, -5.917424305), (19.683300133, -8.656037093), (17.5, -10.5))
            Line((17.5, -10.5), (27.5, -10.5))
            Line((27.5, -10.5), (27.5, 15.5))
            Line((27.5, 15.5), (-27.5, 15.5))
            Line((-27.5, 15.5), (-27.5, -10.5))
        make_face()
    extrude(amount=-CUT_EXTRUDE2_DEPTH, mode=Mode.SUBTRACT)

    # Sketch12 → Cut-Extrude3 (cut)
    with BuildSketch(Plane(origin=(0, 13, 0), x_dir=(1, 0, 0), z_dir=(0, 1, 0))):
        with Locations((0, -17.375)):
            Rectangle(SKETCH12_W, SKETCH12_H)
    extrude(amount=-CUT_EXTRUDE3_DEPTH, mode=Mode.SUBTRACT)

    # Sketch14 → Cut-Extrude4 (cut)
    with BuildSketch(Plane(origin=(0, -10, 0), x_dir=(1, 0, 0), z_dir=(0, 1, 0))):
        with BuildLine():
            Line((-25.6, 9.171971899), (-24.3, 9.171971899))
            ThreePointArc((-24.3, 9.171971899), (-23.592893219, 8.87907868), (-23.3, 8.171971899))
            Line((-23.3, 8.171971899), (-23.3, 2.912528276))
            ThreePointArc((-23.3, 2.912528276), (-23.592893219, 2.205421495), (-24.3, 1.912528276))
            Line((-24.3, 1.912528276), (-25.6, 1.912528276))
            ThreePointArc((-25.6, 1.912528276), (-26.307106781, 2.205421495), (-26.6, 2.912528276))
            Line((-26.6, 2.912528276), (-26.6, 8.171971899))
            ThreePointArc((-26.6, 8.171971899), (-26.307106781, 8.87907868), (-25.6, 9.171971899))
        make_face()
        with BuildLine():
            Line((23.3, 8.171971899), (23.3, 2.912528276))
            ThreePointArc((23.3, 2.912528276), (23.592893219, 2.205421495), (24.3, 1.912528276))
            Line((24.3, 1.912528276), (25.6, 1.912528276))
            ThreePointArc((25.6, 1.912528276), (26.307106781, 2.205421495), (26.6, 2.912528276))
            Line((26.6, 2.912528276), (26.6, 8.171971899))
            ThreePointArc((26.6, 8.171971899), (26.307106781, 8.87907868), (25.6, 9.171971899))
            Line((25.6, 9.171971899), (24.3, 9.171971899))
            ThreePointArc((24.3, 9.171971899), (23.592893219, 8.87907868), (23.3, 8.171971899))
        make_face()
    extrude(amount=-CUT_EXTRUDE4_DEPTH, mode=Mode.SUBTRACT)

    # Sketch15 → Cut-Extrude5 (cut, through all)
    with BuildSketch(Plane(origin=(0, -10, 0), x_dir=(1, 0, 0), z_dir=(0, 1, 0))):
        with Locations((0, 14)):
            Rectangle(SKETCH15_W, SKETCH15_H)
    extrude(amount=-CUT_EXTRUDE5_DEPTH, mode=Mode.SUBTRACT)

    # Sketch17 → Cut-Extrude6 (cut)
    with BuildSketch(Plane.XZ.offset(-19)):
        with Locations((0, 21.375)):
            Rectangle(SKETCH17_W, SKETCH17_H)
    extrude(amount=-CUT_EXTRUDE6_DEPTH, mode=Mode.SUBTRACT)

    # Sketch18 → Boss-Extrude8 (add)
    with BuildSketch(Plane.XY.offset(27.5)):
        with BuildLine():
            Line((-24.5, 10), (-24.5, 6))
            ThreePointArc((-24.5, 6), (-23.621320344, 3.878679656), (-21.5, 3))
            Line((-21.5, 3), (-17.5, 3))
            Line((-17.5, 3), (-1.213612242, 3))
            Line((-1.213612242, 3), (21.5, 3))
            ThreePointArc((21.5, 3), (23.621320344, 3.878679656), (24.5, 6))
            Line((24.5, 6), (24.5, 10))
            Line((24.5, 10), (-1.213612242, 10))
            Line((-1.213612242, 10), (-24.5, 10))
        make_face()
    extrude(amount=-BOSS_EXTRUDE8_DEPTH)

    # Sketch19 → Cut-Extrude8 (cut)
    with BuildSketch(Plane(origin=(0, 0, 10.5), x_dir=(-1, 0, 0), z_dir=(0, 0, -1))):
        with Locations((0, 6.75)):
            Rectangle(SKETCH19_W, SKETCH19_H)
    extrude(amount=-CUT_EXTRUDE8_DEPTH, mode=Mode.SUBTRACT)

    # Sketch20 → Cut-Extrude9 (cut)
    with BuildSketch(Plane(origin=(0, 0, 10.5), x_dir=(-1, 0, 0), z_dir=(0, 0, -1))):
        with Locations((22.5, -3.5)):
            Rectangle(SKETCH20_W, SKETCH20_H)
        with Locations((-22.5, -3.5)):
            Rectangle(SKETCH20_W, SKETCH20_H)
    extrude(amount=-CUT_EXTRUDE9_DEPTH, mode=Mode.SUBTRACT)

    # Sketch16 → Boss-Extrude9 (add)
    with BuildSketch(Plane.ZY.offset(27.5)):
        with Locations((-2.5, -13)):
            Rectangle(SKETCH16_W, SKETCH16_H)
    boss_extrude9 = extrude(amount=BOSS_EXTRUDE9_DEPTH)

    # Sketch22 → Boss-Extrude10 (add)
    with BuildSketch(Plane(origin=(0, -10, 0), x_dir=(1, 0, 0), z_dir=(0, 1, 0))):
        Polygon((-32.5, -10.5), (-27.5, -18.5), (-27.5, -10.5), align=None)
    boss_extrude10 = extrude(amount=-BOSS_EXTRUDE10_DEPTH)

    # Mirror3: Boss-Extrude9, Boss-Extrude10 across plane
    add(boss_extrude9.mirror(Plane(origin=(0, 0, 0), x_dir=(0, 0, 1), z_dir=(1, 0, 0))))
    add(boss_extrude10.mirror(Plane(origin=(0, 0, 0), x_dir=(0, 0, 1), z_dir=(1, 0, 0))))

    # Sketch23 → Cut-Extrude10 (cut)
    # profile 1 of 2: a face of its own
    with BuildSketch(Plane(origin=(0, -10, 0), x_dir=(1, 0, 0), z_dir=(0, 1, 0))):
        with BuildLine():
            Line((32.5, 15.5), (20.5, 15.5))
            Line((20.5, 15.5), (20.5, -5.917424305))
            ThreePointArc((20.5, -5.917424305), (19.683300133, -8.656037093), (17.5, -10.5))
            Line((17.5, -10.5), (17.5, -15.5))
            Line((17.5, -15.5), (27.5, -15.5))
            Line((27.5, -15.5), (27.5, -18.5))
            Line((27.5, -18.5), (32.5, -10.5))
            Line((32.5, -10.5), (32.5, 15.5))
        make_face()
        with Locations(Location((24.95, -5, 0), (0, 0, 90))):
            Circle(SKETCH23_R, mode=Mode.SUBTRACT)
        with BuildLine():
            Line((25.6, 1.912528276), (24.3, 1.912528276))
            ThreePointArc((24.3, 1.912528276), (23.592893219, 2.205421495), (23.3, 2.912528276))
            Line((23.3, 2.912528276), (23.3, 8.171971899))
            ThreePointArc((23.3, 8.171971899), (23.592893219, 8.87907868), (24.3, 9.171971899))
            Line((24.3, 9.171971899), (25.6, 9.171971899))
            ThreePointArc((25.6, 9.171971899), (26.307106781, 8.87907868), (26.6, 8.171971899))
            Line((26.6, 8.171971899), (26.6, 2.912528276))
            ThreePointArc((26.6, 2.912528276), (26.307106781, 2.205421495), (25.6, 1.912528276))
        make_face(mode=Mode.SUBTRACT)
    # profile 2 of 2: a face of its own
    with BuildSketch(Plane(origin=(0, -10, 0), x_dir=(1, 0, 0), z_dir=(0, 1, 0))):
        with BuildLine():
            Line((-20.5, -5.917424305), (-20.5, 15.5))
            Line((-20.5, 15.5), (-32.5, 15.5))
            Line((-32.5, 15.5), (-32.5, -10.5))
            Line((-32.5, -10.5), (-27.5, -18.5))
            Line((-27.5, -18.5), (-27.5, -15.5))
            Line((-27.5, -15.5), (-17.5, -15.5))
            Line((-17.5, -15.5), (-17.5, -10.5))
            ThreePointArc((-17.5, -10.5), (-19.683300133, -8.656037093), (-20.5, -5.917424305))
        make_face()
        with Locations(Location((-24.95, -5, 0), (0, 0, 270))):
            Circle(SKETCH23_R, mode=Mode.SUBTRACT)
        with BuildLine():
            Line((-24.3, 9.171971899), (-25.6, 9.171971899))
            ThreePointArc((-25.6, 9.171971899), (-26.307106781, 8.87907868), (-26.6, 8.171971899))
            Line((-26.6, 8.171971899), (-26.6, 2.912528276))
            ThreePointArc((-26.6, 2.912528276), (-26.307106781, 2.205421495), (-25.6, 1.912528276))
            Line((-25.6, 1.912528276), (-24.3, 1.912528276))
            ThreePointArc((-24.3, 1.912528276), (-23.592893219, 2.205421495), (-23.3, 2.912528276))
            Line((-23.3, 2.912528276), (-23.3, 8.171971899))
            ThreePointArc((-23.3, 8.171971899), (-23.592893219, 8.87907868), (-24.3, 9.171971899))
        make_face(mode=Mode.SUBTRACT)
    extrude(amount=-CUT_EXTRUDE10_DEPTH, mode=Mode.SUBTRACT)


solid = part_1.part
